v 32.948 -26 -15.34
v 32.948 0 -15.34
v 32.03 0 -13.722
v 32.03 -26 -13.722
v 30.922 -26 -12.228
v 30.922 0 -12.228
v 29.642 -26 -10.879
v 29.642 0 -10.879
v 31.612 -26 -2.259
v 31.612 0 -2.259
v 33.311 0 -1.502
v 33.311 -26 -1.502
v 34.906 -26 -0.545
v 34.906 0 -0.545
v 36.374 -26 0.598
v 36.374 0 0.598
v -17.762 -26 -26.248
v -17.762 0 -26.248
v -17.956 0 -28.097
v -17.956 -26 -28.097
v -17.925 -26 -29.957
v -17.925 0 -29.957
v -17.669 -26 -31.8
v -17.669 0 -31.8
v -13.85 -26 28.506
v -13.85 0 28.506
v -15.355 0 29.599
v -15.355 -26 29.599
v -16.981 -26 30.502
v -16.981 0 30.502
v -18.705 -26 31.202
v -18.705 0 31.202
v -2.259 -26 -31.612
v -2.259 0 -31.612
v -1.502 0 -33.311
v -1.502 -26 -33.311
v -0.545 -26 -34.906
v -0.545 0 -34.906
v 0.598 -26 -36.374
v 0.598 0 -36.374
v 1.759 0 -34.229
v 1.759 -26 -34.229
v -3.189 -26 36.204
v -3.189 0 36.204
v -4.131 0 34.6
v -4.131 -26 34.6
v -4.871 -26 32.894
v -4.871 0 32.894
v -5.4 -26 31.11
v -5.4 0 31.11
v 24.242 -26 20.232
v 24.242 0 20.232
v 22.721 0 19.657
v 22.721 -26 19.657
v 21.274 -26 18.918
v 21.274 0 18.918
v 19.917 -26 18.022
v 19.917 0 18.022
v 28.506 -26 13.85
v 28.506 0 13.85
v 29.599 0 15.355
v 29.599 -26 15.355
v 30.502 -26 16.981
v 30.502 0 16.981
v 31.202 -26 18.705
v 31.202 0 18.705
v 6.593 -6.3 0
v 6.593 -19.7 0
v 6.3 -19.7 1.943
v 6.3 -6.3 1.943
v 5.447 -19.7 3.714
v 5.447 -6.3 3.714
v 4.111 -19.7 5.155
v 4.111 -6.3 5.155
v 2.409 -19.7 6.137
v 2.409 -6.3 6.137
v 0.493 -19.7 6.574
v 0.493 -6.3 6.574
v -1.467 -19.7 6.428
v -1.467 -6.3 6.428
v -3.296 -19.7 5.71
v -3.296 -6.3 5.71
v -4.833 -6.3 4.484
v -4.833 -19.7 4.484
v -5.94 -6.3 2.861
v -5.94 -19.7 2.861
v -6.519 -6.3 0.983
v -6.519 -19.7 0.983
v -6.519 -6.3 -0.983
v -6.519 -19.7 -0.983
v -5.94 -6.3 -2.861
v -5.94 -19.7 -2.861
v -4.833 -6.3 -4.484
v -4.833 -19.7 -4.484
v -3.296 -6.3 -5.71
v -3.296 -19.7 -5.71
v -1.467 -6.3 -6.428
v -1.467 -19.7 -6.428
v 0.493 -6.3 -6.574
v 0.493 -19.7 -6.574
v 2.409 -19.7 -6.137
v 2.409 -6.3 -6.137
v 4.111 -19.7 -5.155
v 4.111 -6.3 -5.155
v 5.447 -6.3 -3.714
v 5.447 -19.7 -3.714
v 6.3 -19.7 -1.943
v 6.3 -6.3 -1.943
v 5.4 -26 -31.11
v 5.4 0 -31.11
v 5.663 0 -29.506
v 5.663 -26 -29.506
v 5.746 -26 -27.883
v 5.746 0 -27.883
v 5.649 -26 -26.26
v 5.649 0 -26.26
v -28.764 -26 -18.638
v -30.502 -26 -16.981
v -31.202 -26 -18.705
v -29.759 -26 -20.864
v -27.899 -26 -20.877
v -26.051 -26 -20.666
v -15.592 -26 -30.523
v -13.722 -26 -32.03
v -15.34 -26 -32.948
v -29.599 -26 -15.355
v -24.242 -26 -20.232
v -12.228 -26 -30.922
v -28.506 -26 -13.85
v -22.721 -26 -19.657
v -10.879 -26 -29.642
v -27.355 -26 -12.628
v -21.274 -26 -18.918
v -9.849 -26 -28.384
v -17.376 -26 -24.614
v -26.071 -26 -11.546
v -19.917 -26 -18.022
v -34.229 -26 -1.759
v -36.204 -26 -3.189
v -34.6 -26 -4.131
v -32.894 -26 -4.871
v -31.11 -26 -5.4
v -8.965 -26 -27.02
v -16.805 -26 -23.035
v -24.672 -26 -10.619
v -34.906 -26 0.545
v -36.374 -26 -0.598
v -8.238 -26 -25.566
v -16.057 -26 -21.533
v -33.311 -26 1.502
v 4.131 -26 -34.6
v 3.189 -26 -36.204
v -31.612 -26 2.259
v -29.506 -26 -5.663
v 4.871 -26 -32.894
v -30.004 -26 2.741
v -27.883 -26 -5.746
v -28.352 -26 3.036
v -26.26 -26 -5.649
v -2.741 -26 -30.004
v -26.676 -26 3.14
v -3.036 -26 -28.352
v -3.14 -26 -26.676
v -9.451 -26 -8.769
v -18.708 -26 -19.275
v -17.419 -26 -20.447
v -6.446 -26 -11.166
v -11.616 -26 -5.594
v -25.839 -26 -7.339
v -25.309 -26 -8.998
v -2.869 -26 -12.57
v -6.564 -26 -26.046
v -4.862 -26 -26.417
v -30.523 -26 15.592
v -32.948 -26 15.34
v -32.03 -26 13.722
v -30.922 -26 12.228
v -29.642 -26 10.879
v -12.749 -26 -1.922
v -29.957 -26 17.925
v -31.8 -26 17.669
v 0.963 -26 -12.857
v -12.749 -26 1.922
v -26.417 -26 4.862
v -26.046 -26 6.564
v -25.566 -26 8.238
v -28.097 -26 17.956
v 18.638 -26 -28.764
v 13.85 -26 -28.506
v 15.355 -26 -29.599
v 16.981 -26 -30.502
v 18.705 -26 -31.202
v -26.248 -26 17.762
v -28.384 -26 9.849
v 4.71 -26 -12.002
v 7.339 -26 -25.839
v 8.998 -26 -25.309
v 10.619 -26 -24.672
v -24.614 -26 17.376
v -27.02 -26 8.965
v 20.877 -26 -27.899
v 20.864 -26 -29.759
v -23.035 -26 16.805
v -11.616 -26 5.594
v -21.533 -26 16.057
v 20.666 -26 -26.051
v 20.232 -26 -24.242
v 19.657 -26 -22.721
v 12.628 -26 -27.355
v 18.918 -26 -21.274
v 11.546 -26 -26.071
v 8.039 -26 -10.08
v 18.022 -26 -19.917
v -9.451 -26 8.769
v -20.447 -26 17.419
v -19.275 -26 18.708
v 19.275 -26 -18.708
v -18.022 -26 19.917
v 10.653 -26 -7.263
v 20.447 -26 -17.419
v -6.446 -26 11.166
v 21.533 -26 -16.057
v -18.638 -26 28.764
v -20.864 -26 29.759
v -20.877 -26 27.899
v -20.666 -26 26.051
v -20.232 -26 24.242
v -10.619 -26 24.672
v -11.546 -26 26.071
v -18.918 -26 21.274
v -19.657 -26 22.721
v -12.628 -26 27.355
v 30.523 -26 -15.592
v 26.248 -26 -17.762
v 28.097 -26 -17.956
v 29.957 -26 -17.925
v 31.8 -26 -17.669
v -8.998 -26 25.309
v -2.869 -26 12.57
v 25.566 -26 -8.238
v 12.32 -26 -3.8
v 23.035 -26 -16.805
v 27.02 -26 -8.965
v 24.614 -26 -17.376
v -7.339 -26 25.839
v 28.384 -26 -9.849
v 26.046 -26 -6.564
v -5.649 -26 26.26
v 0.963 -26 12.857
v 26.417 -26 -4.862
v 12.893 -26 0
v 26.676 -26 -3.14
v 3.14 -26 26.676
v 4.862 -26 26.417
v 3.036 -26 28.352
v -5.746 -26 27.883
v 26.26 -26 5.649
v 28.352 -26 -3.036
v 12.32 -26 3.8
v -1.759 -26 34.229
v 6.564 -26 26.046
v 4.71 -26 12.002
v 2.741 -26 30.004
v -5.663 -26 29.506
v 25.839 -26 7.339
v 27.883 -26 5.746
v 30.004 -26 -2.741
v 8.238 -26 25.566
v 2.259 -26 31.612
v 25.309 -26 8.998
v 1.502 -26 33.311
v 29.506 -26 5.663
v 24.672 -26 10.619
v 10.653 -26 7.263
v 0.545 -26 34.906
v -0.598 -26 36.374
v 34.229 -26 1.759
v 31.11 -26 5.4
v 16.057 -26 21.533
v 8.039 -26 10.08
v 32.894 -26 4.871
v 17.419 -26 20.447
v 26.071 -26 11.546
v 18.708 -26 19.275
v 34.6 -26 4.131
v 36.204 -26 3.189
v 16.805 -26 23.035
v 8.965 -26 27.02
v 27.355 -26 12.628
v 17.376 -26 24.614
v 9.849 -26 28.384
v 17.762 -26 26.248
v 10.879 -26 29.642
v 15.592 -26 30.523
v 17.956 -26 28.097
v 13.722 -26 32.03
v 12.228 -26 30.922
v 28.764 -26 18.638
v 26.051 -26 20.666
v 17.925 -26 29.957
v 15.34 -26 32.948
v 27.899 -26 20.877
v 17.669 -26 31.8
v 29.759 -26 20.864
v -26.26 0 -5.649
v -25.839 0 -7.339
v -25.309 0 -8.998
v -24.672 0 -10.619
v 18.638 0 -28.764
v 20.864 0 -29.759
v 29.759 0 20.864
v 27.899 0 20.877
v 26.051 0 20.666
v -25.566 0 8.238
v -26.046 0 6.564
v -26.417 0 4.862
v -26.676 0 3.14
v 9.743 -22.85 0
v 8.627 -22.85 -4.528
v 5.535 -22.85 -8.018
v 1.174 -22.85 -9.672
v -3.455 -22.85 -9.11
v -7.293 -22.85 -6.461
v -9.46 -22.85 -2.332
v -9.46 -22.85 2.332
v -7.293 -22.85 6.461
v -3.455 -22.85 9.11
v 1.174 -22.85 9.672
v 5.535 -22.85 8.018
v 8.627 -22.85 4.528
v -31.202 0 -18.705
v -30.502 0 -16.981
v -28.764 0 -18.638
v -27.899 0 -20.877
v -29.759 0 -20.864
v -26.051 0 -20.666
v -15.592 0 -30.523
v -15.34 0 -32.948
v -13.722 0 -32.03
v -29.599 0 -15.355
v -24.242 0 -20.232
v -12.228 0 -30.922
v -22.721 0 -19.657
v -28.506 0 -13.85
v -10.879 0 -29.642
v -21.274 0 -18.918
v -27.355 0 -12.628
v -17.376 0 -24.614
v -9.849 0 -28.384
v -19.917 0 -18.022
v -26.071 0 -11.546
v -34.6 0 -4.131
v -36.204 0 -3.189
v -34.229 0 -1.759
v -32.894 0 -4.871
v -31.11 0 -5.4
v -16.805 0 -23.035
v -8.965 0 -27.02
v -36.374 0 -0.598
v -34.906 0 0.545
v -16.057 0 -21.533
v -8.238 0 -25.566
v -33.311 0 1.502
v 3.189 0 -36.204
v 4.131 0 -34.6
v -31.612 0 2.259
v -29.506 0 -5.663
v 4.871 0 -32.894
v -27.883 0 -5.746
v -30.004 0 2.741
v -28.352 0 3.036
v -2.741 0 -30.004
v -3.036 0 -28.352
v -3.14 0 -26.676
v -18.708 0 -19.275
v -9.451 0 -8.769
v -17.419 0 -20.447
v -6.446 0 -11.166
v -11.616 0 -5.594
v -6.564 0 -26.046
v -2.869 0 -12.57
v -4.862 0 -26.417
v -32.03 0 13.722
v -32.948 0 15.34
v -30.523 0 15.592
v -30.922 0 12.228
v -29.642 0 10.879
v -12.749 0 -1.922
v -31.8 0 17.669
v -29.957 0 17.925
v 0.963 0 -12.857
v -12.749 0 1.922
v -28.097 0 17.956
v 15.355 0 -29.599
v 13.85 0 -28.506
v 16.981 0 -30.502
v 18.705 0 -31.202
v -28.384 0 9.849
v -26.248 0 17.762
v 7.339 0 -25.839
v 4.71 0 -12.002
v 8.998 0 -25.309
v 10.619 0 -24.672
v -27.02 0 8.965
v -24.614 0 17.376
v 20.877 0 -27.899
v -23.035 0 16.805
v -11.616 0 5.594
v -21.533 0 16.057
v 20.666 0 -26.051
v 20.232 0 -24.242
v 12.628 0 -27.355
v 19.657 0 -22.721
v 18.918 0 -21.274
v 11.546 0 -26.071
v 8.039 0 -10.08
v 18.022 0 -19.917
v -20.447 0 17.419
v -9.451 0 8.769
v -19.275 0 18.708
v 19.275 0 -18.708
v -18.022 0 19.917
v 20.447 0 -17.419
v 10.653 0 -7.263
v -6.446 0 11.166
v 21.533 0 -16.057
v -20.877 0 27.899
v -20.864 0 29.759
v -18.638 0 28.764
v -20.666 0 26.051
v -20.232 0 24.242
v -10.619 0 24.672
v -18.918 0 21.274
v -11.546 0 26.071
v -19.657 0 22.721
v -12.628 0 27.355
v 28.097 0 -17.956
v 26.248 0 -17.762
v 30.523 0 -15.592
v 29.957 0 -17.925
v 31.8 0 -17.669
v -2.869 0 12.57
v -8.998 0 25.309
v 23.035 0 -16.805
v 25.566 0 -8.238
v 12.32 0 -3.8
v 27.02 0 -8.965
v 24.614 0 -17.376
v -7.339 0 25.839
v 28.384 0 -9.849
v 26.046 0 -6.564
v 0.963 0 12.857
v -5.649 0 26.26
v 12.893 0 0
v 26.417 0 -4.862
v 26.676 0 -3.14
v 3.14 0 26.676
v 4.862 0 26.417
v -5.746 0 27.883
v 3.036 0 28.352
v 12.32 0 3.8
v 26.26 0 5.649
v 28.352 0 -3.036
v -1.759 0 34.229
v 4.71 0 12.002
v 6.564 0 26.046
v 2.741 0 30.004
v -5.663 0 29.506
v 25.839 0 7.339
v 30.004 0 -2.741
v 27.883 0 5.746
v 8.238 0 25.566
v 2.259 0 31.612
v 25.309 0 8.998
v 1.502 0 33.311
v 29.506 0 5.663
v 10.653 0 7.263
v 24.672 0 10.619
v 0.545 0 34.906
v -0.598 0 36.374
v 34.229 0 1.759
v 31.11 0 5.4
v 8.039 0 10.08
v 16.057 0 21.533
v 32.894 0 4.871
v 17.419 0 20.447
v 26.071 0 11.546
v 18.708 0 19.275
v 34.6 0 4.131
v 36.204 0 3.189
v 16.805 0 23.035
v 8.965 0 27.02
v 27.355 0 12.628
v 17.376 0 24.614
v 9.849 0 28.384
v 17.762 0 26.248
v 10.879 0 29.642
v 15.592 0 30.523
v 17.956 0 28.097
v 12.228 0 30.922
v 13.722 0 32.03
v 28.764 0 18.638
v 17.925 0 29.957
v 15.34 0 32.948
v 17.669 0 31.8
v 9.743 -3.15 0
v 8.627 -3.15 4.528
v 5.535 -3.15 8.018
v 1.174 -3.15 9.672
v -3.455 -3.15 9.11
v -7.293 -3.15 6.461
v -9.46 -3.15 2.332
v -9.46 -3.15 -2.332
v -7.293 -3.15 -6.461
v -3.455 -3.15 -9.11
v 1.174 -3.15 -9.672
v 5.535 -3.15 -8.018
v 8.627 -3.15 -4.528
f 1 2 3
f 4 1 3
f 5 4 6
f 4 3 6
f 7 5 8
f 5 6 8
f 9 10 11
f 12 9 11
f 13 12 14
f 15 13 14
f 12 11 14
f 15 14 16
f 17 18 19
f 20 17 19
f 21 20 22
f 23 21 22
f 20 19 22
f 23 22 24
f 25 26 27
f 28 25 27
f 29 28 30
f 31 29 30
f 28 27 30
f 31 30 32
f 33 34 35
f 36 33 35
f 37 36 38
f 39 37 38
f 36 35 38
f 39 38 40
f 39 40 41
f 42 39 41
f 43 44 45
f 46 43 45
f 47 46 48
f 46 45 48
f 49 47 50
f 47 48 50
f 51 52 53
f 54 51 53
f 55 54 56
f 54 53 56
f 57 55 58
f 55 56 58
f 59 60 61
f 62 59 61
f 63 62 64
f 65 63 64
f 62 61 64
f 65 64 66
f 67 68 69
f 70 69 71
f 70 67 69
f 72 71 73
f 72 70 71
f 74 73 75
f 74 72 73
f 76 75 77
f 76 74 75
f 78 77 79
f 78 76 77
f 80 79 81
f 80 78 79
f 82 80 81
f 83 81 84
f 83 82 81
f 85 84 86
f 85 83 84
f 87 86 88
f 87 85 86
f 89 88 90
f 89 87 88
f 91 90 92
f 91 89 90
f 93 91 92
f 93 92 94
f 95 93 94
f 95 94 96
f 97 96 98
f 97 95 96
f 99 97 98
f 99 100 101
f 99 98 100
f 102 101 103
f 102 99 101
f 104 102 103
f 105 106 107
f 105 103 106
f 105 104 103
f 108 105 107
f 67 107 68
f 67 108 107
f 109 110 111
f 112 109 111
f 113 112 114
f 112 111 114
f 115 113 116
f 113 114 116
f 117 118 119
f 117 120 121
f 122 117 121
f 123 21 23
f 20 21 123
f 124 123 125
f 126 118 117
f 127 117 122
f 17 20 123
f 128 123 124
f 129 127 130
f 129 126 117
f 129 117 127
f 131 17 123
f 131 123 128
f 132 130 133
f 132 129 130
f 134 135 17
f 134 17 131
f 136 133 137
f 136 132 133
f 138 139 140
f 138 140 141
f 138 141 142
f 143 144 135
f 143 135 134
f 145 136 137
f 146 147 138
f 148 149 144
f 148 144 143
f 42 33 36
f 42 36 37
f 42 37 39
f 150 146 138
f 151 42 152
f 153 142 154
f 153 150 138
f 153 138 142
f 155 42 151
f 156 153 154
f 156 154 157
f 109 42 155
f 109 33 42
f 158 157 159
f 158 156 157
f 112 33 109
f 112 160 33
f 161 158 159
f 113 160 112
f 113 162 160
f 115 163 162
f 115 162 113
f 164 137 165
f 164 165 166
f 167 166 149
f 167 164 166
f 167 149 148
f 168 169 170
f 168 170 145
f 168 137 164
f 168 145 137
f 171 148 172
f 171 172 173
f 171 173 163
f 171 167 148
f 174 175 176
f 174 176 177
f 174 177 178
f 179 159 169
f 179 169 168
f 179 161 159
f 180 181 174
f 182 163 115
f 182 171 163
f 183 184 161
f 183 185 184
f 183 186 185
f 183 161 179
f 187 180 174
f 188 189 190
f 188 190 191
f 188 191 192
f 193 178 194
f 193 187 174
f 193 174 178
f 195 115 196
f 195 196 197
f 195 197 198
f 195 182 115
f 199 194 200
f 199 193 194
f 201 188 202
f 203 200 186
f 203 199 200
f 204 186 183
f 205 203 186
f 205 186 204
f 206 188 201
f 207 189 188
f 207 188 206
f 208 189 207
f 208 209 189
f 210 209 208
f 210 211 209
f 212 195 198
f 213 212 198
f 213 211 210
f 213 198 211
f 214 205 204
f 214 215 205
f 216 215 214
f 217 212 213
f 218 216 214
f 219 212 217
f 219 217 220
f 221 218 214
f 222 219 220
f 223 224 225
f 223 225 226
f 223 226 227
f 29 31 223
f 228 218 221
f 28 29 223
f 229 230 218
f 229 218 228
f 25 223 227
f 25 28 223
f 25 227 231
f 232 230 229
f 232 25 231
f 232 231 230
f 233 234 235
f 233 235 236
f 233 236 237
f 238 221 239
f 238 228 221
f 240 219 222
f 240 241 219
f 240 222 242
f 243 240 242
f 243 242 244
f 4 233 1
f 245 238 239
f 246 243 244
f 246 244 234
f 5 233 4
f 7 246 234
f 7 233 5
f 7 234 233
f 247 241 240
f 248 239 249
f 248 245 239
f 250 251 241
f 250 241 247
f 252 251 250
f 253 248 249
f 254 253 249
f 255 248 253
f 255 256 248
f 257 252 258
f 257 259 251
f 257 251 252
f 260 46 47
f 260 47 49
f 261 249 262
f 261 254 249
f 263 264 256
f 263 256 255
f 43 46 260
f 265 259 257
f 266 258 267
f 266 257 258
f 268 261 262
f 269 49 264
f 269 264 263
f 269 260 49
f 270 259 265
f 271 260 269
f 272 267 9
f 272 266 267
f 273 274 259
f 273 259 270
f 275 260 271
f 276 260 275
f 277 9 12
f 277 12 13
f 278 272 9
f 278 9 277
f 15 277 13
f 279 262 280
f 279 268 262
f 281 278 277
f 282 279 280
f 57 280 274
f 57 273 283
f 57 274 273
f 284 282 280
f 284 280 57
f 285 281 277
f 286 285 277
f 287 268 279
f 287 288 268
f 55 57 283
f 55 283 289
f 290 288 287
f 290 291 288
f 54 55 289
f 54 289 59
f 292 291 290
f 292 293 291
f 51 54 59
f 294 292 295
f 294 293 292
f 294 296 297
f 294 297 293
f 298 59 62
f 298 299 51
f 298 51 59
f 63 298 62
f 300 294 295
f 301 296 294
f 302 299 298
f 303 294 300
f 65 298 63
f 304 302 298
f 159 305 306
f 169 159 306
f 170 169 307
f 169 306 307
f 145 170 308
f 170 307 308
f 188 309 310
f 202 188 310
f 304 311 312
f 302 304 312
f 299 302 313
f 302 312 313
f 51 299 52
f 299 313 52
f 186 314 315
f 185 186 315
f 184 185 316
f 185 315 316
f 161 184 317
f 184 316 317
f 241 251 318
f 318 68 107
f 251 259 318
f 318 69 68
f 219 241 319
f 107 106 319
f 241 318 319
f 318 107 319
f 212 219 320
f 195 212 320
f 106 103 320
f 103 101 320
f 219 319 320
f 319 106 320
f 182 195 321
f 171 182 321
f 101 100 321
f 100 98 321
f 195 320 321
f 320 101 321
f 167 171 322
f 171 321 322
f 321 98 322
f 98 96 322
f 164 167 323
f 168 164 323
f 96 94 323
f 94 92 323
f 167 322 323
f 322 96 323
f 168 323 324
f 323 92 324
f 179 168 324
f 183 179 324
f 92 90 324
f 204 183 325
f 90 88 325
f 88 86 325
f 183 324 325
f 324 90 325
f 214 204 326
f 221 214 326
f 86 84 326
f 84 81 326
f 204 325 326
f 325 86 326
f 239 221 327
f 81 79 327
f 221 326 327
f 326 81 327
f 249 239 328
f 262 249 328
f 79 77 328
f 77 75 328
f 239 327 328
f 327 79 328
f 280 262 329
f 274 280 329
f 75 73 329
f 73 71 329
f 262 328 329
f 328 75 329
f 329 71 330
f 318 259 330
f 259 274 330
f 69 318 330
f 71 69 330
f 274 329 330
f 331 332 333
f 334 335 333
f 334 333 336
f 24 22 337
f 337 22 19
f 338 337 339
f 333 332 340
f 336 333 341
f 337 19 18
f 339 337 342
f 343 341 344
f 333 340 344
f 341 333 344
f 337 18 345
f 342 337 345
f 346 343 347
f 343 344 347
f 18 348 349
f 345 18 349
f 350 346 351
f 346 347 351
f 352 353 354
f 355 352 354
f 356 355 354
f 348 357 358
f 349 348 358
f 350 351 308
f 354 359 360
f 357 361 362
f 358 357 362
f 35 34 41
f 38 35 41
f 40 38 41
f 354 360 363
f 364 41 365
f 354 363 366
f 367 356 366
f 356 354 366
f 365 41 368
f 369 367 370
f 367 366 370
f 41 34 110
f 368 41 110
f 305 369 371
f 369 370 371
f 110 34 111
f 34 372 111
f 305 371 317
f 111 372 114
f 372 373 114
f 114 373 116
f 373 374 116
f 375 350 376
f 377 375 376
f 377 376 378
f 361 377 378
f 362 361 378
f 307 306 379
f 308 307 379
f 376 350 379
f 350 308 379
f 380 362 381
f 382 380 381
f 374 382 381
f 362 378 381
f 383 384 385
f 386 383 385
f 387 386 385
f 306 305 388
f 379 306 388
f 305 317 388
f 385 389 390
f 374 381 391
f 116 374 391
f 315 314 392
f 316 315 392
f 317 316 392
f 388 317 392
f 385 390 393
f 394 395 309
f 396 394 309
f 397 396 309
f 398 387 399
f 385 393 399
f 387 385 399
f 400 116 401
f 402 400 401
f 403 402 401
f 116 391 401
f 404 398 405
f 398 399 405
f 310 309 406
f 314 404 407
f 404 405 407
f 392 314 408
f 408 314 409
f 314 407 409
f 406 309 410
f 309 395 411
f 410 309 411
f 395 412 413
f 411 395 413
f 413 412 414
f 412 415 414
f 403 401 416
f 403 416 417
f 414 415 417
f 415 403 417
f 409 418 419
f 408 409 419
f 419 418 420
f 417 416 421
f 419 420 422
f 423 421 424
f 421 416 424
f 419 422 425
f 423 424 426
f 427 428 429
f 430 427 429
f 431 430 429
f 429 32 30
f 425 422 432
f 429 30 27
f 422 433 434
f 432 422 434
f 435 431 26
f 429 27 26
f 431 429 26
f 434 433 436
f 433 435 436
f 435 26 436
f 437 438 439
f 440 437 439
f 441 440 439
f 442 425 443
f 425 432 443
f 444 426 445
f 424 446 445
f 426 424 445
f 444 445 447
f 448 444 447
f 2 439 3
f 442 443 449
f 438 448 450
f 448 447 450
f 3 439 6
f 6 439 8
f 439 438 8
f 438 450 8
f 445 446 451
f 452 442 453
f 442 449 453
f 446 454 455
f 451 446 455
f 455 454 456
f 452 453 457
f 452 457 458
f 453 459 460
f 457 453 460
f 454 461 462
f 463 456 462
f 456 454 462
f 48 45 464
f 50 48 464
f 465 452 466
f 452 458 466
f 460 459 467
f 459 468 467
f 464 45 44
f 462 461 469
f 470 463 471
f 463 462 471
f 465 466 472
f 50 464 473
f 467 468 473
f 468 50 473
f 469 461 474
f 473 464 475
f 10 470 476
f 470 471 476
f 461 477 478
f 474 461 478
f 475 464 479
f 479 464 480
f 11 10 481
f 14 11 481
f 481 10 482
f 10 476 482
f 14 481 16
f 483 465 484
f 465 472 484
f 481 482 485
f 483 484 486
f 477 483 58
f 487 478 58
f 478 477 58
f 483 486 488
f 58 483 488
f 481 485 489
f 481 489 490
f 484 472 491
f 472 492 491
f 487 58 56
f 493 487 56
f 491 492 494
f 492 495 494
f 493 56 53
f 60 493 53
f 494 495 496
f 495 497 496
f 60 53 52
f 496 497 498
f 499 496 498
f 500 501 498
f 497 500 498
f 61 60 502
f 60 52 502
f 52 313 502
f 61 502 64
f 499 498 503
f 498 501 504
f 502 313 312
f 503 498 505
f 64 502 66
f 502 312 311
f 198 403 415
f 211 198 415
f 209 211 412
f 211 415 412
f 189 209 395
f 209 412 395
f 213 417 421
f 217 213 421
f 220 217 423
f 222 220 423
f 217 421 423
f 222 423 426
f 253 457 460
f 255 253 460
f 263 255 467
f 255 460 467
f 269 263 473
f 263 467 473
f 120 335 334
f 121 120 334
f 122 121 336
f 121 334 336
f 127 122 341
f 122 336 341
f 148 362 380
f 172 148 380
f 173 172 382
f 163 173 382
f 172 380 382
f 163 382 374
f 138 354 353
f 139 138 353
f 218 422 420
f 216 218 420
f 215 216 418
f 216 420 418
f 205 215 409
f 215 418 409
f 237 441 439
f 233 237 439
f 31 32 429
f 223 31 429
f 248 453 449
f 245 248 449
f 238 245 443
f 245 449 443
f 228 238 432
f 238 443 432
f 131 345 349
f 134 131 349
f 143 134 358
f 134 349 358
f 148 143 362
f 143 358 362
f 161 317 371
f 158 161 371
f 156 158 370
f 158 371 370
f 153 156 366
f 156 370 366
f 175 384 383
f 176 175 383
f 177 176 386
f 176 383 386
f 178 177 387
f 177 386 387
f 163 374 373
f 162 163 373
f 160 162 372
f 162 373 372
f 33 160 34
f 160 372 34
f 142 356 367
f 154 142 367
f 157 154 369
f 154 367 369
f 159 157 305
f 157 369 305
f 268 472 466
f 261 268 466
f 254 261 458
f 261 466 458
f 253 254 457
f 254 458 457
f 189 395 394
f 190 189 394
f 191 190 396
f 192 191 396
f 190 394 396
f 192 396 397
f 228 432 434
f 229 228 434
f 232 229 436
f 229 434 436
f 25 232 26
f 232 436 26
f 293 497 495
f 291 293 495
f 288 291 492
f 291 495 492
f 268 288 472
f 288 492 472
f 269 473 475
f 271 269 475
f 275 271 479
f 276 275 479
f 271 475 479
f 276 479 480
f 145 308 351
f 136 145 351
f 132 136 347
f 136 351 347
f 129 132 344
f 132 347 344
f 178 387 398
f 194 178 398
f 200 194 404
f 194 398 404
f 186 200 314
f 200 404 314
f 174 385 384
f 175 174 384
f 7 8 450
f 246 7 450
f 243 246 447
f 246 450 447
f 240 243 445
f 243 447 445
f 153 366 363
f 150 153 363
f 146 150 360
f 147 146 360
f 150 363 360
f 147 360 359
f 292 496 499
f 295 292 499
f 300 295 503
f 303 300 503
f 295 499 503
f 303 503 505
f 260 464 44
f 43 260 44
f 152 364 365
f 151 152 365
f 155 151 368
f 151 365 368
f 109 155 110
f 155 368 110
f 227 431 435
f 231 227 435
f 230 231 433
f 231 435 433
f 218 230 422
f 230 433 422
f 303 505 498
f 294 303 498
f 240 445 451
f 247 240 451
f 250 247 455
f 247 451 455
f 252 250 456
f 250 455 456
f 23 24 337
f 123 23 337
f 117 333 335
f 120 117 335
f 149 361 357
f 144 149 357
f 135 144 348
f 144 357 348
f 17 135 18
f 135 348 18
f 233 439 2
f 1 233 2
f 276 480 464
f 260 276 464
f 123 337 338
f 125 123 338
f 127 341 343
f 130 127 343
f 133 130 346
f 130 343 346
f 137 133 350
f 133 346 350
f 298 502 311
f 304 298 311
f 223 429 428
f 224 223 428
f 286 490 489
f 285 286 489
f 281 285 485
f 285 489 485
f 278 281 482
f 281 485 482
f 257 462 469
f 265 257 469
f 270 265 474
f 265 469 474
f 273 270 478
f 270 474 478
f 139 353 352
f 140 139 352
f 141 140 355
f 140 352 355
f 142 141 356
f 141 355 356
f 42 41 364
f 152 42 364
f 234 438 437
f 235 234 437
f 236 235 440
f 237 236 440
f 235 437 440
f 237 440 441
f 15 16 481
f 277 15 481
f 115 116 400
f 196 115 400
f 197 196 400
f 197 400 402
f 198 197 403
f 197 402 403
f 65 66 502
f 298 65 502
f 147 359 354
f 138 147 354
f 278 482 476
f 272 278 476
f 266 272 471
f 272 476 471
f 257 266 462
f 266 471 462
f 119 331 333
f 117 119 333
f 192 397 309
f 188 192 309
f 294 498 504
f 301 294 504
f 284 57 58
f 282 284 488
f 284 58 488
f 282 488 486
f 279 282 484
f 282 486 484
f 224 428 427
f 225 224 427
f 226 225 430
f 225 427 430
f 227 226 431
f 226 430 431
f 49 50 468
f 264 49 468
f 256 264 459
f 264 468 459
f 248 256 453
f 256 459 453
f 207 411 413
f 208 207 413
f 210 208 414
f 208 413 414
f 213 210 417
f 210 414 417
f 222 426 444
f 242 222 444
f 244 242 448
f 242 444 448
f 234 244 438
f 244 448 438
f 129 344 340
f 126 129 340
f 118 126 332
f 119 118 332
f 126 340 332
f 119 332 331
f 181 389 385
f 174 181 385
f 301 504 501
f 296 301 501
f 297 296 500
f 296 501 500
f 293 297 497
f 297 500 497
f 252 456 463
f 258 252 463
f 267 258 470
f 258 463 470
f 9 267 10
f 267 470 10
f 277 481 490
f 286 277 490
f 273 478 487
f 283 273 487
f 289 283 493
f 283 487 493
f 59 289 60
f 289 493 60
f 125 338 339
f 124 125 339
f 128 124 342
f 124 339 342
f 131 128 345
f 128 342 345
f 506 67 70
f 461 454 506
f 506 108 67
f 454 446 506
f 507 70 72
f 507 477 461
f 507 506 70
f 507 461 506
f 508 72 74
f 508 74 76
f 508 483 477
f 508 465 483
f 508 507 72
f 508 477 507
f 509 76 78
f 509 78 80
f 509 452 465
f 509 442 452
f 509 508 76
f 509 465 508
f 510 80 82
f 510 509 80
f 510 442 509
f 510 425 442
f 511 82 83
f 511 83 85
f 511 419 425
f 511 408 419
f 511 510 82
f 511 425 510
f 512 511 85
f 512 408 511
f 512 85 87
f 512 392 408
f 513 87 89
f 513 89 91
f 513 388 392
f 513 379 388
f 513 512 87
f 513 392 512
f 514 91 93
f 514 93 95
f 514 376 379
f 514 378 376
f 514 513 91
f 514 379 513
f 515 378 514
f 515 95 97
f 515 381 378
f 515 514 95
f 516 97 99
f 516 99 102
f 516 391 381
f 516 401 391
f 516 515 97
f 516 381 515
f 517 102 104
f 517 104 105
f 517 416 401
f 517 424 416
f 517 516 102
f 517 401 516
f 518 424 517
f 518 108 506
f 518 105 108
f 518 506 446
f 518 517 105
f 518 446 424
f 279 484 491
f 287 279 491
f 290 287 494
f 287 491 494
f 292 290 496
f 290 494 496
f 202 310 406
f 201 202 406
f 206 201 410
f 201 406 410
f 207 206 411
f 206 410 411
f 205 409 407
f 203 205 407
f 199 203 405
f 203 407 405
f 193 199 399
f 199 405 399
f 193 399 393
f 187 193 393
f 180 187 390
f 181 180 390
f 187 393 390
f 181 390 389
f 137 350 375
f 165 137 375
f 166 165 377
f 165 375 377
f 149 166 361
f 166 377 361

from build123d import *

# Parameters (mm, degrees)
F0_R     = 6.5928960908
F1_DEPTH = 26
F2_COUNT = 12
F3_SIZE  = 6.3


# Not quite as in the source:
# - a feature names something its author has since deleted; it is built from what else it names


with BuildPart() as f1:
    # F0 (on Front) → F1 (new body)
    with BuildSketch(Plane.XZ):
        with BuildLine():
            ThreePointArc((-5.6485408912, 26.2598637858), (-16.878445243, -20.8950842647), (26.8605, 0))
            ThreePointArc((26.8605, 0), (20.0726478905, 17.8486768953), (3.1397750014, 26.6763616933))
            ThreePointArc((3.1397750014, 26.6763616933), (-1.2715518862, 26.8303860585), (-5.6485408912, 26.2598637858))
        make_face()
        Circle(F0_R, mode=Mode.SUBTRACT)
        with BuildLine():
            ThreePointArc((-5.6485408912, 26.2598637858), (-1.2715518862, 26.8303860585), (3.1397750014, 26.6763616933))
            ThreePointArc((3.1397750014, 26.6763616933), (2.912439248, 29.1823081791), (2.258607373, 31.6121133592))
            ThreePointArc((2.258607373, 31.6121133592), (1.0476425624, 34.1233003108), (-0.5978331908, 36.3738347416))
            Line((-0.5978331908, 36.3738347416), (-1.7586341705, 34.2293752337))
            Line((-1.7586341705, 34.2293752337), (-3.1894124709, 36.2039736615))
            ThreePointArc((-3.1894124709, 36.2039736615), (-4.5270572612, 33.7579151802), (-5.3998864293, 31.1101491555))
            ThreePointArc((-5.3998864293, 31.1101491555), (-5.727107406, 28.6954080102), (-5.6485408912, 26.2598637858))
        make_face()
    extrude(amount=F1_DEPTH)

    # F2: F1 ×12 about axis
    f2_axis = Axis((0, 0, 0), (0, 1, 0))


with BuildPart() as f1_1:
    add(f1.part)
    for i in range(1, F2_COUNT):
        add(f1.part.rotate(f2_axis, i * 360 / F2_COUNT))

    # F3
    f3_edges = [f1_1.edges().sort_by_distance(p)[0] for p in [
        (-6.592896, 0, 0),
        (6.592896, -13, 0),
        (-6.592896, -26, 0),
    ]]
    chamfer(f3_edges, length=F3_SIZE)


solid = f1_1.part
